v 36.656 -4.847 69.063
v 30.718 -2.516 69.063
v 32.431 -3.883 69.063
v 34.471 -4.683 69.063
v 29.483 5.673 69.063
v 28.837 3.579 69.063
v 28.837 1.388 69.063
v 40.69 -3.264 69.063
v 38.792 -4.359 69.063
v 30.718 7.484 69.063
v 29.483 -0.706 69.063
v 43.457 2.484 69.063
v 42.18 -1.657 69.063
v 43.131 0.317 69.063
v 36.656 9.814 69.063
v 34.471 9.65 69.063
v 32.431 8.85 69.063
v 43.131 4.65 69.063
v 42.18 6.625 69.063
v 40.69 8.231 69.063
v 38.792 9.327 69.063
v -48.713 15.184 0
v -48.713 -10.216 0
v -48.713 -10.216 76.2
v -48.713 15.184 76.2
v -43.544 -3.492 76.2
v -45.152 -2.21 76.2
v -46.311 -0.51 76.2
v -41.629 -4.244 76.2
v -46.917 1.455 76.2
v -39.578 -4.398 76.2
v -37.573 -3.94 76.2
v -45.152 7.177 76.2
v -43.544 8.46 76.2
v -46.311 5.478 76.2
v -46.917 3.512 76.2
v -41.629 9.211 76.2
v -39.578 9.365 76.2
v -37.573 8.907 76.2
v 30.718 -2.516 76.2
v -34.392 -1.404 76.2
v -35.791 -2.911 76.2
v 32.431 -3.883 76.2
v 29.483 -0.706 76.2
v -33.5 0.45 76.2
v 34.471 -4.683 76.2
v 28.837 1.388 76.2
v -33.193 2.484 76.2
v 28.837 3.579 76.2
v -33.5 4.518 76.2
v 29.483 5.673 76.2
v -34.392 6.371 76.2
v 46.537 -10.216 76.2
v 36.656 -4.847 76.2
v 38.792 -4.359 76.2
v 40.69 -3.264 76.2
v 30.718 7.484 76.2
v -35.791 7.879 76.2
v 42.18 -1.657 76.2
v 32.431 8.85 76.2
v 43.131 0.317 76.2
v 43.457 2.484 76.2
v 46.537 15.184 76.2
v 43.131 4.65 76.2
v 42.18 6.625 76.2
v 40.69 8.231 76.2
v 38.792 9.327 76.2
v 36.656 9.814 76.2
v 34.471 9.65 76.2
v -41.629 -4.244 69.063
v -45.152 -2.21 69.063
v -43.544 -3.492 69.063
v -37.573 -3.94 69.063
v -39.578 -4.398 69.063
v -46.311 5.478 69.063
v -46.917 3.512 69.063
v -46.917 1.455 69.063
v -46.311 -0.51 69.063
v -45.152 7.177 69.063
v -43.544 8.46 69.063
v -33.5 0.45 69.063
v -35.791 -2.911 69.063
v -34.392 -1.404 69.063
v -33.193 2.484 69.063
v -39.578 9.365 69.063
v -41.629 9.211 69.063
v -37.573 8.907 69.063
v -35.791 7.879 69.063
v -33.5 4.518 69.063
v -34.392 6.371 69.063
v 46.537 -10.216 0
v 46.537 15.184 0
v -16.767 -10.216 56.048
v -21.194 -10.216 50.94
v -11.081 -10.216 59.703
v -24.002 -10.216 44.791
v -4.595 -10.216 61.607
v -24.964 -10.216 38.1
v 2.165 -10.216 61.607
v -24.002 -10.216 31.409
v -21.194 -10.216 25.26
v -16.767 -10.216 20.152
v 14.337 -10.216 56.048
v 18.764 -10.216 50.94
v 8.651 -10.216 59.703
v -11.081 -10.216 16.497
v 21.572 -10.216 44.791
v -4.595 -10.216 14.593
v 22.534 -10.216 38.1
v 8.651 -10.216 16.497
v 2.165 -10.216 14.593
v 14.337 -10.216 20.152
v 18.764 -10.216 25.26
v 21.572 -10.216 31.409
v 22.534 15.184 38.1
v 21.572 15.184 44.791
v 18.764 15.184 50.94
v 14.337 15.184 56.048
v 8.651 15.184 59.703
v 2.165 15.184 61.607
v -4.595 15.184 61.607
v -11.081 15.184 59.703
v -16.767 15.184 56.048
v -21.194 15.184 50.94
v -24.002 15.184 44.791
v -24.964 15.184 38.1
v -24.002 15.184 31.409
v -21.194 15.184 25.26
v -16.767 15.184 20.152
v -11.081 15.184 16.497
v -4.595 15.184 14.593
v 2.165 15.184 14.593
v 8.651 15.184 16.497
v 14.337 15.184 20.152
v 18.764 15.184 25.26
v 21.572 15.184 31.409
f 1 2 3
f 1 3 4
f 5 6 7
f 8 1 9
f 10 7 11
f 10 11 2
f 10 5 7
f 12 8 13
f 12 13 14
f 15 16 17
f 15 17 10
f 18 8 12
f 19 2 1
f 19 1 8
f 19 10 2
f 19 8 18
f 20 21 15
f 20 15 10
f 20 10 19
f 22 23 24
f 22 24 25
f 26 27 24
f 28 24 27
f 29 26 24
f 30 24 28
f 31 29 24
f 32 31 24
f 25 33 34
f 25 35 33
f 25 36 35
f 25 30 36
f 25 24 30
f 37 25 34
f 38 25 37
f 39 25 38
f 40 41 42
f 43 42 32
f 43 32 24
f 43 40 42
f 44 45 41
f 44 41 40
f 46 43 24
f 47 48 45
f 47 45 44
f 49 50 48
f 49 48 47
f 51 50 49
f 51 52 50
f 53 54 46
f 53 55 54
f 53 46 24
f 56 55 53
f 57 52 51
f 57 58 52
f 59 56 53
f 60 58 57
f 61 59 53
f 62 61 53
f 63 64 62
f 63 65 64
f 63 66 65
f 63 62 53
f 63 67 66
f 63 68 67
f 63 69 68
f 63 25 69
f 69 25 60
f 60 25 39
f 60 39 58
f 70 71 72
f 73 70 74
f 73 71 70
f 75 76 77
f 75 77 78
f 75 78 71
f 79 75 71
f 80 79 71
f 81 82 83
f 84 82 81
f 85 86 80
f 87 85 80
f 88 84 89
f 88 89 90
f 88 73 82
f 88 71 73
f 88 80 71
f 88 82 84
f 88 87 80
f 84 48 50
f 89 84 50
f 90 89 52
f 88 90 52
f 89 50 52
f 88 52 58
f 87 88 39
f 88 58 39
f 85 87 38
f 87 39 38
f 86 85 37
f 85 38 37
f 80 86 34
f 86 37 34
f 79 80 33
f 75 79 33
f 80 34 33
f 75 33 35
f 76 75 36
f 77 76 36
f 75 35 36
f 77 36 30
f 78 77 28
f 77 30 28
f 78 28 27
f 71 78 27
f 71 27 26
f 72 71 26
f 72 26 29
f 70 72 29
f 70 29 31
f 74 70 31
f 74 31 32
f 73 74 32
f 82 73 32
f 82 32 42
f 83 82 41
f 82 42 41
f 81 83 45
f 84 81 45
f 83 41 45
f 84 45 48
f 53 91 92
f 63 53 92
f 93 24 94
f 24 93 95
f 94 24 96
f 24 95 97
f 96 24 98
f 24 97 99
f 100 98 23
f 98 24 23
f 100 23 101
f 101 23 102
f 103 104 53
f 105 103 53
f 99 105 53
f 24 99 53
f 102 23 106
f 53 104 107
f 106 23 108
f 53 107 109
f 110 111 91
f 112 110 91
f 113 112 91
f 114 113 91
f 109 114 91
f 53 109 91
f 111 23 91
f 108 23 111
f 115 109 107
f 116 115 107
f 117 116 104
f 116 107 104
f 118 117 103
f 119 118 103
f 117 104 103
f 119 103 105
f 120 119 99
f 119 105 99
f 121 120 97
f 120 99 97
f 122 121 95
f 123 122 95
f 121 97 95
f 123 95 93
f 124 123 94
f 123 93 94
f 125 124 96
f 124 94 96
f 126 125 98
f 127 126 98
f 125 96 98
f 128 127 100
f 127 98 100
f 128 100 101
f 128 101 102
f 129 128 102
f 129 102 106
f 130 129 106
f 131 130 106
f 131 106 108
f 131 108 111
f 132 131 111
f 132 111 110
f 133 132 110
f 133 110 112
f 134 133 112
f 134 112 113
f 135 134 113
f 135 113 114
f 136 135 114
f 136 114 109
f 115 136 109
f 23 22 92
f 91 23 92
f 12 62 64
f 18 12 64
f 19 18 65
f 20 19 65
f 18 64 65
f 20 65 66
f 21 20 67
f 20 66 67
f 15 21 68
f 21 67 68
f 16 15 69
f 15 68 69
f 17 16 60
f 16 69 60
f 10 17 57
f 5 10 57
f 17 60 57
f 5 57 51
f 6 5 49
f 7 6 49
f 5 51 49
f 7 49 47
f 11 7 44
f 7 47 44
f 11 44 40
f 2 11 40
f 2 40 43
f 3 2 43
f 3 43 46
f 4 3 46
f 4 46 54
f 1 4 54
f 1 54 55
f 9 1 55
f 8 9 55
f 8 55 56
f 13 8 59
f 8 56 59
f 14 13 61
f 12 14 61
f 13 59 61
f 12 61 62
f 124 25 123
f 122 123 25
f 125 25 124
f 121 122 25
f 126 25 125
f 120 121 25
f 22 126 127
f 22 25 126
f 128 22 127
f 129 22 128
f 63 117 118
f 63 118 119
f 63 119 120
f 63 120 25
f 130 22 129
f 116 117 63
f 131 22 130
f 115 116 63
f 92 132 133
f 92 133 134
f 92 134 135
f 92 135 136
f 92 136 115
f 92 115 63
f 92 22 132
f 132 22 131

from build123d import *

# Parameters (mm, degrees)
F0_W     = 95.25
F0_H     = 25.4
F1_DEPTH = 76.2
F2_R     = 7.35111
F2_R_2   = 6.900606
F3_DEPTH = 7.1374
F4_R     = 23.749
F5_DEPTH = 35.1103


with BuildPart() as f1:
    # F0 (on Top) → F1 (new body)
    with BuildSketch(Plane.XY):
        with Locations((-1.087826, 2.483681)):
            Rectangle(F0_W, F0_H)
    extrude(amount=F1_DEPTH)

    # F2 (on face) → F3 (cut)
    with BuildSketch(Plane.XY.offset(76.2)):
        with Locations((36.106295, 2.483681)):
            Circle(F2_R)
        with Locations((-40.093705, 2.483681)):
            Circle(F2_R_2)
    extrude(amount=-F3_DEPTH, mode=Mode.SUBTRACT)

    # F4 (on face) → F5 (cut)
    with BuildSketch(Plane.XZ.offset(10.216319)):
        with Locations((-1.214826, 38.1)):
            Circle(F4_R)
    extrude(amount=-F5_DEPTH, mode=Mode.SUBTRACT)


solid = f1.part
